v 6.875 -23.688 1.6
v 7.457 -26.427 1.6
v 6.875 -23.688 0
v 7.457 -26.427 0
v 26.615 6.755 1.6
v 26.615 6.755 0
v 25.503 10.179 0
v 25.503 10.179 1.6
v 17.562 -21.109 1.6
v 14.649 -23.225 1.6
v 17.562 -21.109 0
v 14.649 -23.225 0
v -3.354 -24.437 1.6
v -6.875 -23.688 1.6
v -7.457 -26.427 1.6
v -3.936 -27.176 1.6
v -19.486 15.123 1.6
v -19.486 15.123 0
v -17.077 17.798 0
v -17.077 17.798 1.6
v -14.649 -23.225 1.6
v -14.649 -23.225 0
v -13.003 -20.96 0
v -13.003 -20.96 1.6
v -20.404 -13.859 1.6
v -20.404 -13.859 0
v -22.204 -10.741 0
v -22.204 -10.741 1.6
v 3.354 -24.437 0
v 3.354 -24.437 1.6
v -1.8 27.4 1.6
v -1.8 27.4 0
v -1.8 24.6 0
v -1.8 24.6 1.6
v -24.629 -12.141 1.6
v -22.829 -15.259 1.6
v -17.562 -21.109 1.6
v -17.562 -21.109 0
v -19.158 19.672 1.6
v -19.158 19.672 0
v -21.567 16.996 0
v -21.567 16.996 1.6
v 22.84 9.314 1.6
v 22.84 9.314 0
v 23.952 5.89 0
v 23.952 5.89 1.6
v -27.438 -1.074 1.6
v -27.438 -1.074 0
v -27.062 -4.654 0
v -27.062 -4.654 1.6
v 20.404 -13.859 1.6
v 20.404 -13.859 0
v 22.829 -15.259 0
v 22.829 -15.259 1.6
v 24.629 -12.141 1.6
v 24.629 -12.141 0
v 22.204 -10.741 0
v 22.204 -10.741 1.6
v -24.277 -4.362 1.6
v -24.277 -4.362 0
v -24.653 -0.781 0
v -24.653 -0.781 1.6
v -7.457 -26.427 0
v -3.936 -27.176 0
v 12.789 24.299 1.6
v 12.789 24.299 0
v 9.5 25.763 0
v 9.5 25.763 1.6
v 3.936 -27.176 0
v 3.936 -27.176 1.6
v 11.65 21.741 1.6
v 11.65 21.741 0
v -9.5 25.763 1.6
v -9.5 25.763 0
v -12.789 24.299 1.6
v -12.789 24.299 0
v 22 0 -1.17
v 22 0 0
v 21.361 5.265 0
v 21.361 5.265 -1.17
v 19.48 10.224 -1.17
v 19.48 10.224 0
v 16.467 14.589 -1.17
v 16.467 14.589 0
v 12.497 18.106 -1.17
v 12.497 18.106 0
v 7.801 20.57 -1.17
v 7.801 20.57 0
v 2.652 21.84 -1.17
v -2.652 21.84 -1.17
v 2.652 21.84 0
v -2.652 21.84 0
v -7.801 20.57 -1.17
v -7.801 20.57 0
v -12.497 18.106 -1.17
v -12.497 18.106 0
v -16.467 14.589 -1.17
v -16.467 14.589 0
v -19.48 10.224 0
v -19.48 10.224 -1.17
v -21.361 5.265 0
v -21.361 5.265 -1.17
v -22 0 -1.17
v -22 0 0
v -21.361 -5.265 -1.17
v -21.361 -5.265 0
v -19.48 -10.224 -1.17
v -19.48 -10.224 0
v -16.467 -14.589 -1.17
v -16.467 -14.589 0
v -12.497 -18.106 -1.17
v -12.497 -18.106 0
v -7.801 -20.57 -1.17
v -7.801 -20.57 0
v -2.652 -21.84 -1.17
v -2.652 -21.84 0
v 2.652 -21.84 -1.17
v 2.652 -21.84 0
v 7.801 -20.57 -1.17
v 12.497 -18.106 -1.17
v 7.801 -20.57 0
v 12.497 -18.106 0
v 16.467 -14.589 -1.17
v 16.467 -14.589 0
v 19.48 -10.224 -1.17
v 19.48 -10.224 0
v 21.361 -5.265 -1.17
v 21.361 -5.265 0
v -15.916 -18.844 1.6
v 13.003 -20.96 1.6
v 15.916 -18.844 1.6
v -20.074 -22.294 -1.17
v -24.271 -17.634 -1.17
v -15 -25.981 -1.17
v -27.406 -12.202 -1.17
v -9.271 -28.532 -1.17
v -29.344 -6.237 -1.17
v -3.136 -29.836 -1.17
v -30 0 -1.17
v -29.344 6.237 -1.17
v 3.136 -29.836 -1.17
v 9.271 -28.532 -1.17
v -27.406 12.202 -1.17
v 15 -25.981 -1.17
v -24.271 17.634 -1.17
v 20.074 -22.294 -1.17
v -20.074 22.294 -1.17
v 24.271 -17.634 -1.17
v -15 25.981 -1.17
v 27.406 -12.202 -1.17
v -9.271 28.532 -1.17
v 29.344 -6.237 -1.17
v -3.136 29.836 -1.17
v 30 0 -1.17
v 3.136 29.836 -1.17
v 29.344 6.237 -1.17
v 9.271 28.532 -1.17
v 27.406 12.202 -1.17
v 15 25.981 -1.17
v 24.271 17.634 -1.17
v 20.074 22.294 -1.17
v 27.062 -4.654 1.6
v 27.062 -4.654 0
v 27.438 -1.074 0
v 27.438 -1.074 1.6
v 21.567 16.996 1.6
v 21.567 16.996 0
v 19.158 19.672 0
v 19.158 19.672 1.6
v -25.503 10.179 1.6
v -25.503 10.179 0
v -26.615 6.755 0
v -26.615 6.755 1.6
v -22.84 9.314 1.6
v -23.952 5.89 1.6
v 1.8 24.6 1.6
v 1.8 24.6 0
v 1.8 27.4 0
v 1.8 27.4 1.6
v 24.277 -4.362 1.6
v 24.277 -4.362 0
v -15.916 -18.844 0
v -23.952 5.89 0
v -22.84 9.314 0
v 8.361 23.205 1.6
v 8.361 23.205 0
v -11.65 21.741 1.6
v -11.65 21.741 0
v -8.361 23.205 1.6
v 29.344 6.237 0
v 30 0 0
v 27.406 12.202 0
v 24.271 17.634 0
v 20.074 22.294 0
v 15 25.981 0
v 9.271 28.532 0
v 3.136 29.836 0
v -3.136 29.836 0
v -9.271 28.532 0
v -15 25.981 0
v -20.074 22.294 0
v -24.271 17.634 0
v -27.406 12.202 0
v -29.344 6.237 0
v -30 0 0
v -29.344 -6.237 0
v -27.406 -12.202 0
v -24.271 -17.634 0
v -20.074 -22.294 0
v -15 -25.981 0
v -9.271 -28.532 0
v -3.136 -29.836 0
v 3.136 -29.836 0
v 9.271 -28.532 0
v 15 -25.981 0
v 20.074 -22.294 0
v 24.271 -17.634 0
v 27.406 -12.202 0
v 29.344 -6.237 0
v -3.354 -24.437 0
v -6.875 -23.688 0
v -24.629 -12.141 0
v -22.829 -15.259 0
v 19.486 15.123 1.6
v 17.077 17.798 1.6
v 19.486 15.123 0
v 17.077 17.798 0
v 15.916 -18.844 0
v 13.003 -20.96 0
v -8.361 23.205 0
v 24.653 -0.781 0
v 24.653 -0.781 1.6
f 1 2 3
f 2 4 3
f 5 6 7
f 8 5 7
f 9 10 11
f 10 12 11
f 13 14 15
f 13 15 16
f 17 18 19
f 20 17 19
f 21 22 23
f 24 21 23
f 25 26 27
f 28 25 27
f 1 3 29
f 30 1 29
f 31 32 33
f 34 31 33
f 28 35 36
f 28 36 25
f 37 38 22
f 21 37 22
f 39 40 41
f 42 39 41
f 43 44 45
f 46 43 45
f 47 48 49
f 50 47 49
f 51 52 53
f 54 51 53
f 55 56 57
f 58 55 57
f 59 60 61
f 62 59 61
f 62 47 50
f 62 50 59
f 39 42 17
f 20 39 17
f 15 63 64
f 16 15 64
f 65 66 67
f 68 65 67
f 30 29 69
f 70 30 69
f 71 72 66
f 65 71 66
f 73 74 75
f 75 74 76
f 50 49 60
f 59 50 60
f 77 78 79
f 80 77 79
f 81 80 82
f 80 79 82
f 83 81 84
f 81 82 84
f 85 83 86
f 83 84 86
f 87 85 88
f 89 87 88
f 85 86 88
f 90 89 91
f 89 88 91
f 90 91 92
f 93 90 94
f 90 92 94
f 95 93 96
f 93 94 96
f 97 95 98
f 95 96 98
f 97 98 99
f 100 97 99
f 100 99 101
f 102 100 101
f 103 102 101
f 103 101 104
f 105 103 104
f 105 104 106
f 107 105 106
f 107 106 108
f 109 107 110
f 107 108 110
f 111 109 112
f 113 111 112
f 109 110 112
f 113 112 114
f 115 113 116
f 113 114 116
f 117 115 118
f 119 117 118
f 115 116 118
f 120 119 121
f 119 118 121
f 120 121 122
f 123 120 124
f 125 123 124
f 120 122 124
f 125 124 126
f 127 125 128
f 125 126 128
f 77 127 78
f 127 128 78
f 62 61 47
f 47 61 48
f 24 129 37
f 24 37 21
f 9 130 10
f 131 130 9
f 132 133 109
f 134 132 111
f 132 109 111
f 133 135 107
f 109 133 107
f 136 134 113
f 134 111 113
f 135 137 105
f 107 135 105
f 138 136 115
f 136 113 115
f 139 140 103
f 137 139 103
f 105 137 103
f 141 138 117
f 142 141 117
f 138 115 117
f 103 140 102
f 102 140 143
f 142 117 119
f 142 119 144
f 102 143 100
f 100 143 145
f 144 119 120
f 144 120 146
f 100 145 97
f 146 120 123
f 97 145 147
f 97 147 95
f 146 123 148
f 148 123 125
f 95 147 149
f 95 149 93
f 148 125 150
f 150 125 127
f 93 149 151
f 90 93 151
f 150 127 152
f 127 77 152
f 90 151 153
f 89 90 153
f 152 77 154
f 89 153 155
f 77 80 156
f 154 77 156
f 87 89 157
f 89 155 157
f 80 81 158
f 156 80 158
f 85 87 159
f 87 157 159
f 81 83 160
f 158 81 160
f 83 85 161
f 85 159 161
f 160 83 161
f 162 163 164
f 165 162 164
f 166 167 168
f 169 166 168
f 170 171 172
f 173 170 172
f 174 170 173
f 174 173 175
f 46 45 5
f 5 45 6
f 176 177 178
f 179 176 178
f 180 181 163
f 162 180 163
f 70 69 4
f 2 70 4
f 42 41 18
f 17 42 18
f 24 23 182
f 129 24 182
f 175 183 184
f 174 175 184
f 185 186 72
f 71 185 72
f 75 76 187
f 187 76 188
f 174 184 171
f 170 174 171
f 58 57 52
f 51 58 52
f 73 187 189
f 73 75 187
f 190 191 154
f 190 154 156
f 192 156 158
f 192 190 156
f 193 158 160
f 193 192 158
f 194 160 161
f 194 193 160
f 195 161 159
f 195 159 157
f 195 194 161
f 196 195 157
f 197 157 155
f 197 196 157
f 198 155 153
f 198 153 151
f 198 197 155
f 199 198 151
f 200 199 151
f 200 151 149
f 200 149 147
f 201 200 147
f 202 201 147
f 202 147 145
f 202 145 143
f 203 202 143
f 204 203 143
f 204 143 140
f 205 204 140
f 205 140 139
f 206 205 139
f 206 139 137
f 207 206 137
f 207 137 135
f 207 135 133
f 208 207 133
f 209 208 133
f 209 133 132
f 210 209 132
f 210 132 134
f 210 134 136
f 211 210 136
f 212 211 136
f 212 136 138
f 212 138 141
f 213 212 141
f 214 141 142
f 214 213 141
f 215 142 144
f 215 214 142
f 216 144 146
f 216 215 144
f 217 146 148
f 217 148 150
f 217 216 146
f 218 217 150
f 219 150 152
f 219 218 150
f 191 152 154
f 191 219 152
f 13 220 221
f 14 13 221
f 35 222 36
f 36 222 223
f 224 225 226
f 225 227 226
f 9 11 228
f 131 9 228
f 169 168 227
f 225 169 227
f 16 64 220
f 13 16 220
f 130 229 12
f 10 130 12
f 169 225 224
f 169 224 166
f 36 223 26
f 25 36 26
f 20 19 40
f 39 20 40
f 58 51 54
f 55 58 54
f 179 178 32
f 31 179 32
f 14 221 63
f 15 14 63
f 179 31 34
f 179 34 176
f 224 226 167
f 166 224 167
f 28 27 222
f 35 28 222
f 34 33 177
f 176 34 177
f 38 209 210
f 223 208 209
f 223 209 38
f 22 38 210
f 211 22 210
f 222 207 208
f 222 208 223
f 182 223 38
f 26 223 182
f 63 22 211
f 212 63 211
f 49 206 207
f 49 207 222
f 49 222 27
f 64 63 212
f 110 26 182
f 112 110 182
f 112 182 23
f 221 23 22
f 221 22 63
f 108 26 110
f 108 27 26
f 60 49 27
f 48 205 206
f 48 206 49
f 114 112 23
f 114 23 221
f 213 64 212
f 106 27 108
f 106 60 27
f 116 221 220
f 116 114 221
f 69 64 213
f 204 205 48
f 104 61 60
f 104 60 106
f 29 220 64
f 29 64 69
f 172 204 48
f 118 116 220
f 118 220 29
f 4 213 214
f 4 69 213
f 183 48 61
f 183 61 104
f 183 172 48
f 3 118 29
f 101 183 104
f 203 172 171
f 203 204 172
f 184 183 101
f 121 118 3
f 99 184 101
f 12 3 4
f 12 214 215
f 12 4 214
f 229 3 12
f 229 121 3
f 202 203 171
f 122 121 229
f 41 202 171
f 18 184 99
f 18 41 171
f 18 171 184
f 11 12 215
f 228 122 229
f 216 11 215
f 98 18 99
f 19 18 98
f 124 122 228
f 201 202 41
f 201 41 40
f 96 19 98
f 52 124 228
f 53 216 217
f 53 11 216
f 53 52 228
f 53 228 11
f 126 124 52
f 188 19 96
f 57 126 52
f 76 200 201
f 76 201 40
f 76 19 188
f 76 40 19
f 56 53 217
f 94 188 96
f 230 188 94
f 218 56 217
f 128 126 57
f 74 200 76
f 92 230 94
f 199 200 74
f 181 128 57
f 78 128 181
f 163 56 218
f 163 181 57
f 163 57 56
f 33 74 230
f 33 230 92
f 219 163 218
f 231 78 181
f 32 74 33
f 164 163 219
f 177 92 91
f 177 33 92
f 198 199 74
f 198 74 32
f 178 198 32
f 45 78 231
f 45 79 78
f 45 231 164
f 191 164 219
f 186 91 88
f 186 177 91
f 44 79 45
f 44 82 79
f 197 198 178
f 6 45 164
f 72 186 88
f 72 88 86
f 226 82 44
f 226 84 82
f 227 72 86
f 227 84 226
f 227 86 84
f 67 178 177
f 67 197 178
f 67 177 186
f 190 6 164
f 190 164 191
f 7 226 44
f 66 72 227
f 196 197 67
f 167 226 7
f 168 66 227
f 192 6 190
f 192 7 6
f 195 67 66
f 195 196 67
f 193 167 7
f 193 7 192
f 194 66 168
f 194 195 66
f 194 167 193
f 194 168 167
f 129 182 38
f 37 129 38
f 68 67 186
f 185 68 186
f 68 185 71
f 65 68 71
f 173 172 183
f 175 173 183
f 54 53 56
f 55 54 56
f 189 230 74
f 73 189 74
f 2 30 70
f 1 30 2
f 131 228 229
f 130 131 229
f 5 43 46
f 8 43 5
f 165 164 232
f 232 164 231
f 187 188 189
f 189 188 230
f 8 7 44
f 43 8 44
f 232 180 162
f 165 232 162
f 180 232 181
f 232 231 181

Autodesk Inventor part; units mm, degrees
ref_plane "YZ Plane" through (0, 0, 0) normal (1, 0, 0) x (0, 1, 0)
ref_plane "XZ Plane" through (0, 0, 0) normal (0, 1, 0) x (-1, 0, 0)
ref_plane "XY Plane" through (0, 0, 0) normal (0, 0, 1) x (1, 0, 0)
sketch "Sketch1" plane through (0, 0, 0) normal (0, 0, 1) x (1, 0, 0)
  circle A0 centre (0, 0) radius 30
  circle A1 centre (0, 0) radius 22
  dimension "d0" = 60
  dimension "d1" = 44
extrude "Extrusion1" add sketch "Sketch1" against normal blind 1.17
sketch "Sketch2" plane through (0, 0, 0) normal (0, 0, 1) x (1, 0, 0)
  circle A0 centre (0, 0) radius 26 construction
  line L0 (-1.8, 24.6) -> (1.8, 24.6)
  line L1 (1.8, 24.6) -> (1.8, 27.4)
  line L2 (1.8, 27.4) -> (-1.8, 27.4)
  line L3 (-1.8, 27.4) -> (-1.8, 24.6)
  line L4 (-1.8, 24.6) -> (1.8, 27.4) construction
  line L5 (1.8, 24.6) -> (-1.8, 27.4) construction
  line L6 (12.789, 24.299) -> (9.5002, 25.7633)
  line L7 (11.6501, 21.7411) -> (12.789, 24.299)
  line L8 (8.3613, 23.2053) -> (11.6501, 21.7411)
  circle A1 centre (0, 0) radius 26 construction
  line L9 (9.5002, 25.7633) -> (8.3613, 23.2053)
  line L10 (21.5666, 16.9965) -> (19.1577, 19.6718)
  line L11 (19.4858, 15.123) -> (21.5666, 16.9965)
  line L12 (17.0769, 17.7983) -> (19.4858, 15.123)
  circle A2 centre (0, 0) radius 26 construction
  line L13 (19.1577, 19.6718) -> (17.0769, 17.7983)
  line L14 (26.6152, 6.7552) -> (25.5027, 10.179)
  line L15 (23.9522, 5.8899) -> (26.6152, 6.7552)
  line L16 (22.8398, 9.3137) -> (23.9522, 5.8899)
  circle A3 centre (0, 0) radius 26 construction
  line L17 (25.5027, 10.179) -> (22.8398, 9.3137)
  line L18 (27.0617, -4.6542) -> (27.4381, -1.0739)
  line L19 (24.2771, -4.3615) -> (27.0617, -4.6542)
  line L20 (24.6534, -0.7813) -> (24.2771, -4.3615)
  circle A4 centre (0, 0) radius 26 construction
  line L21 (27.4381, -1.0739) -> (24.6534, -0.7813)
  line L22 (22.8291, -15.2588) -> (24.6291, -12.1412)
  line L23 (20.4042, -13.8588) -> (22.8291, -15.2588)
  line L24 (22.2042, -10.7412) -> (20.4042, -13.8588)
  circle A5 centre (0, 0) radius 26 construction
  line L25 (24.6291, -12.1412) -> (22.2042, -10.7412)
  line L26 (14.6491, -23.2251) -> (17.5615, -21.1091)
  line L27 (13.0033, -20.9598) -> (14.6491, -23.2251)
  line L28 (15.9157, -18.8438) -> (13.0033, -20.9598)
  circle A6 centre (0, 0) radius 26 construction
  line L29 (17.5615, -21.1091) -> (15.9157, -18.8438)
  line L30 (3.9361, -27.1755) -> (7.4574, -26.427)
  line L31 (3.354, -24.4367) -> (3.9361, -27.1755)
  line L32 (6.8753, -23.6882) -> (3.354, -24.4367)
  circle A7 centre (0, 0) radius 26 construction
  line L33 (7.4574, -26.427) -> (6.8753, -23.6882)
  line L34 (-7.4574, -26.427) -> (-3.9361, -27.1755)
  line L35 (-6.8753, -23.6882) -> (-7.4574, -26.427)
  line L36 (-3.354, -24.4367) -> (-6.8753, -23.6882)
  circle A8 centre (0, 0) radius 26 construction
  line L37 (-3.9361, -27.1755) -> (-3.354, -24.4367)
  line L38 (-17.5615, -21.1091) -> (-14.6491, -23.2251)
  line L39 (-15.9157, -18.8438) -> (-17.5615, -21.1091)
  line L40 (-13.0033, -20.9598) -> (-15.9157, -18.8438)
  circle A9 centre (0, 0) radius 26 construction
  line L41 (-14.6491, -23.2251) -> (-13.0033, -20.9598)
  line L42 (-24.6291, -12.1412) -> (-22.8291, -15.2588)
  line L43 (-22.2042, -10.7412) -> (-24.6291, -12.1412)
  line L44 (-20.4042, -13.8588) -> (-22.2042, -10.7412)
  circle A10 centre (0, 0) radius 26 construction
  line L45 (-22.8291, -15.2588) -> (-20.4042, -13.8588)
  line L46 (-27.4381, -1.0739) -> (-27.0617, -4.6542)
  line L47 (-24.6534, -0.7813) -> (-27.4381, -1.0739)
  line L48 (-24.2771, -4.3615) -> (-24.6534, -0.7813)
  circle A11 centre (0, 0) radius 26 construction
  line L49 (-27.0617, -4.6542) -> (-24.2771, -4.3615)
  line L50 (-25.5027, 10.179) -> (-26.6152, 6.7552)
  line L51 (-22.8398, 9.3137) -> (-25.5027, 10.179)
  line L52 (-23.9522, 5.8899) -> (-22.8398, 9.3137)
  circle A12 centre (0, 0) radius 26 construction
  line L53 (-26.6152, 6.7552) -> (-23.9522, 5.8899)
  line L54 (-19.1577, 19.6718) -> (-21.5666, 16.9965)
  line L55 (-17.0769, 17.7983) -> (-19.1577, 19.6718)
  line L56 (-19.4858, 15.123) -> (-17.0769, 17.7983)
  circle A13 centre (0, 0) radius 26 construction
  line L57 (-21.5666, 16.9965) -> (-19.4858, 15.123)
  line L58 (-9.5002, 25.7633) -> (-12.789, 24.299)
  line L59 (-8.3613, 23.2053) -> (-9.5002, 25.7633)
  line L60 (-11.6501, 21.7411) -> (-8.3613, 23.2053)
  circle A14 centre (0, 0) radius 26 construction
  line L61 (-12.789, 24.299) -> (-11.6501, 21.7411)
  point P0 (0, 26)
  point P1 (10.5752, 23.7522)
  point P2 (19.3218, 17.3974)
  point P3 (24.7275, 8.0344)
  point P4 (25.8576, -2.7177)
  point P5 (22.5167, -13)
  point P6 (15.2824, -21.0344)
  point P7 (5.4057, -25.4318)
  point P8 (-5.4057, -25.4318)
  point P9 (-15.2824, -21.0344)
  point P10 (-22.5167, -13)
  point P11 (-25.8576, -2.7177)
  point P12 (-24.7275, 8.0344)
  point P13 (-19.3218, 17.3974)
  point P14 (-10.5752, 23.7522)
  dimension "d4" = 52
  dimension "d5" = 3.6
  dimension "d6" = 2.8
  dimension "d9" = 360
extrude "Extrusion2" add sketch "Sketch2" along normal blind 1.6
properties part number "AndyMarkLightRing2018"
